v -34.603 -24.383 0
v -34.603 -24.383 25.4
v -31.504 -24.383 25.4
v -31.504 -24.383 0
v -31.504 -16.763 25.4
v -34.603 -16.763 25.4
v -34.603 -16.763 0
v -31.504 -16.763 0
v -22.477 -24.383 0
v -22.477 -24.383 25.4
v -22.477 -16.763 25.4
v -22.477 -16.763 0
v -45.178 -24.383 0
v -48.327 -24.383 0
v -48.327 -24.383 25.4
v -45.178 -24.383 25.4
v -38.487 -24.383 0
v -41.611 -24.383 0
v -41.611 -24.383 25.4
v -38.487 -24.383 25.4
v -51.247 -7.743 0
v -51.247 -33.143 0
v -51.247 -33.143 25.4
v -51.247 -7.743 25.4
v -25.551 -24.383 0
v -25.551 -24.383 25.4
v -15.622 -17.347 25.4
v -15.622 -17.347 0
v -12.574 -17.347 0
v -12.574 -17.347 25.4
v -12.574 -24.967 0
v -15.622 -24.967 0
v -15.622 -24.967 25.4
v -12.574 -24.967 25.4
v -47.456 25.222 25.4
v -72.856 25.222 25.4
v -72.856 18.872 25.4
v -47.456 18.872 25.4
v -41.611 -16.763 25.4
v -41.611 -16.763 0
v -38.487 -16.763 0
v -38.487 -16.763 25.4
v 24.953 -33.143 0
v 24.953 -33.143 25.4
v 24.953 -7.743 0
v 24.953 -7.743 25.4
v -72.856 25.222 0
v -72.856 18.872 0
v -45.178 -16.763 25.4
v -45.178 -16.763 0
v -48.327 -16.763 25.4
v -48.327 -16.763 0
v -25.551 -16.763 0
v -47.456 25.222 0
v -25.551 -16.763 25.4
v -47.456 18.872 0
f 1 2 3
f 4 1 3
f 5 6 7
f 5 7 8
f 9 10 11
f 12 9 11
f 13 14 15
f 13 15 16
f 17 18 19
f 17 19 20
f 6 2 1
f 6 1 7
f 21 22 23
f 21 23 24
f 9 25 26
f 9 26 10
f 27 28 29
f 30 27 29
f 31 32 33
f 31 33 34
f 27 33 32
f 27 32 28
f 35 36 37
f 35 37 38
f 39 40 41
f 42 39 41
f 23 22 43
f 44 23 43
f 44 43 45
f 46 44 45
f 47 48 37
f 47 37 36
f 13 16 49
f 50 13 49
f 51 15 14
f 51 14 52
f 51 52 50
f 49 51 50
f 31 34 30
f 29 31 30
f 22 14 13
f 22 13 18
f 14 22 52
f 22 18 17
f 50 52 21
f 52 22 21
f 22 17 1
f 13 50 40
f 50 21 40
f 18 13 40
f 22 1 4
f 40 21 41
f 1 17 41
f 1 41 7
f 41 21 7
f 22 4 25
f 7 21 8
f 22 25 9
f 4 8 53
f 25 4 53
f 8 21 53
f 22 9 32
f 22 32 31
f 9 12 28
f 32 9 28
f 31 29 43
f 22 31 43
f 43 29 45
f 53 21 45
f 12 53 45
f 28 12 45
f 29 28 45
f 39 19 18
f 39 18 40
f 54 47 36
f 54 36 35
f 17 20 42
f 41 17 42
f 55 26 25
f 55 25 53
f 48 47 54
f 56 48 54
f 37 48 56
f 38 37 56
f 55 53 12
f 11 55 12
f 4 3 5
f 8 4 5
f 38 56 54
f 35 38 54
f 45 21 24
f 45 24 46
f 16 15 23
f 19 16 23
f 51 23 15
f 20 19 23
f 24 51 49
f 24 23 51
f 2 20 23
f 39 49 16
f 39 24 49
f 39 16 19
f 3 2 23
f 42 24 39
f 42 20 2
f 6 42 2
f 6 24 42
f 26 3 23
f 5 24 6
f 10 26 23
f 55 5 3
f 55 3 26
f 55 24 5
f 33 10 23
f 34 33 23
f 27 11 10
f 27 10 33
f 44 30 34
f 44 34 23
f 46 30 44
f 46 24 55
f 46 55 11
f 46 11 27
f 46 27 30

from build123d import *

# Parameters (mm, degrees)
F0_W     = 25.4
F0_H     = 6.35
F0_W_2   = 76.2
F0_H_2   = 25.4
F0_W_3   = 3.1496
F0_H_3   = 7.62
F0_W_4   = 3.1242
F0_W_5   = 3.0988
F0_W_6   = 3.0734
F0_W_7   = 3.048
F1_DEPTH = 25.4


with BuildPart() as f1:
    # F0 (on Top) → F1 (new body)
    with BuildSketch(Plane.XY):
        with Locations((-60.155823, 22.046551)):
            Rectangle(F0_W, F0_H)
        with Locations((-13.147284, -20.442827)):
            Rectangle(F0_W_2, F0_H_2)
        with Locations((-46.752408, -20.572608)):
            Rectangle(F0_W_3, F0_H_3, mode=Mode.SUBTRACT)
        with Locations((-40.048942, -20.572608)):
            Rectangle(F0_W_4, F0_H_3, mode=Mode.SUBTRACT)
        with Locations((-33.053466, -20.572608)):
            Rectangle(F0_W_5, F0_H_3, mode=Mode.SUBTRACT)
        with Locations((-24.013939, -20.572608)):
            Rectangle(F0_W_6, F0_H_3, mode=Mode.SUBTRACT)
        with Locations((-14.098391, -21.156624)):
            Rectangle(F0_W_7, F0_H_3, mode=Mode.SUBTRACT)
    extrude(amount=F1_DEPTH)


solid = f1.part
